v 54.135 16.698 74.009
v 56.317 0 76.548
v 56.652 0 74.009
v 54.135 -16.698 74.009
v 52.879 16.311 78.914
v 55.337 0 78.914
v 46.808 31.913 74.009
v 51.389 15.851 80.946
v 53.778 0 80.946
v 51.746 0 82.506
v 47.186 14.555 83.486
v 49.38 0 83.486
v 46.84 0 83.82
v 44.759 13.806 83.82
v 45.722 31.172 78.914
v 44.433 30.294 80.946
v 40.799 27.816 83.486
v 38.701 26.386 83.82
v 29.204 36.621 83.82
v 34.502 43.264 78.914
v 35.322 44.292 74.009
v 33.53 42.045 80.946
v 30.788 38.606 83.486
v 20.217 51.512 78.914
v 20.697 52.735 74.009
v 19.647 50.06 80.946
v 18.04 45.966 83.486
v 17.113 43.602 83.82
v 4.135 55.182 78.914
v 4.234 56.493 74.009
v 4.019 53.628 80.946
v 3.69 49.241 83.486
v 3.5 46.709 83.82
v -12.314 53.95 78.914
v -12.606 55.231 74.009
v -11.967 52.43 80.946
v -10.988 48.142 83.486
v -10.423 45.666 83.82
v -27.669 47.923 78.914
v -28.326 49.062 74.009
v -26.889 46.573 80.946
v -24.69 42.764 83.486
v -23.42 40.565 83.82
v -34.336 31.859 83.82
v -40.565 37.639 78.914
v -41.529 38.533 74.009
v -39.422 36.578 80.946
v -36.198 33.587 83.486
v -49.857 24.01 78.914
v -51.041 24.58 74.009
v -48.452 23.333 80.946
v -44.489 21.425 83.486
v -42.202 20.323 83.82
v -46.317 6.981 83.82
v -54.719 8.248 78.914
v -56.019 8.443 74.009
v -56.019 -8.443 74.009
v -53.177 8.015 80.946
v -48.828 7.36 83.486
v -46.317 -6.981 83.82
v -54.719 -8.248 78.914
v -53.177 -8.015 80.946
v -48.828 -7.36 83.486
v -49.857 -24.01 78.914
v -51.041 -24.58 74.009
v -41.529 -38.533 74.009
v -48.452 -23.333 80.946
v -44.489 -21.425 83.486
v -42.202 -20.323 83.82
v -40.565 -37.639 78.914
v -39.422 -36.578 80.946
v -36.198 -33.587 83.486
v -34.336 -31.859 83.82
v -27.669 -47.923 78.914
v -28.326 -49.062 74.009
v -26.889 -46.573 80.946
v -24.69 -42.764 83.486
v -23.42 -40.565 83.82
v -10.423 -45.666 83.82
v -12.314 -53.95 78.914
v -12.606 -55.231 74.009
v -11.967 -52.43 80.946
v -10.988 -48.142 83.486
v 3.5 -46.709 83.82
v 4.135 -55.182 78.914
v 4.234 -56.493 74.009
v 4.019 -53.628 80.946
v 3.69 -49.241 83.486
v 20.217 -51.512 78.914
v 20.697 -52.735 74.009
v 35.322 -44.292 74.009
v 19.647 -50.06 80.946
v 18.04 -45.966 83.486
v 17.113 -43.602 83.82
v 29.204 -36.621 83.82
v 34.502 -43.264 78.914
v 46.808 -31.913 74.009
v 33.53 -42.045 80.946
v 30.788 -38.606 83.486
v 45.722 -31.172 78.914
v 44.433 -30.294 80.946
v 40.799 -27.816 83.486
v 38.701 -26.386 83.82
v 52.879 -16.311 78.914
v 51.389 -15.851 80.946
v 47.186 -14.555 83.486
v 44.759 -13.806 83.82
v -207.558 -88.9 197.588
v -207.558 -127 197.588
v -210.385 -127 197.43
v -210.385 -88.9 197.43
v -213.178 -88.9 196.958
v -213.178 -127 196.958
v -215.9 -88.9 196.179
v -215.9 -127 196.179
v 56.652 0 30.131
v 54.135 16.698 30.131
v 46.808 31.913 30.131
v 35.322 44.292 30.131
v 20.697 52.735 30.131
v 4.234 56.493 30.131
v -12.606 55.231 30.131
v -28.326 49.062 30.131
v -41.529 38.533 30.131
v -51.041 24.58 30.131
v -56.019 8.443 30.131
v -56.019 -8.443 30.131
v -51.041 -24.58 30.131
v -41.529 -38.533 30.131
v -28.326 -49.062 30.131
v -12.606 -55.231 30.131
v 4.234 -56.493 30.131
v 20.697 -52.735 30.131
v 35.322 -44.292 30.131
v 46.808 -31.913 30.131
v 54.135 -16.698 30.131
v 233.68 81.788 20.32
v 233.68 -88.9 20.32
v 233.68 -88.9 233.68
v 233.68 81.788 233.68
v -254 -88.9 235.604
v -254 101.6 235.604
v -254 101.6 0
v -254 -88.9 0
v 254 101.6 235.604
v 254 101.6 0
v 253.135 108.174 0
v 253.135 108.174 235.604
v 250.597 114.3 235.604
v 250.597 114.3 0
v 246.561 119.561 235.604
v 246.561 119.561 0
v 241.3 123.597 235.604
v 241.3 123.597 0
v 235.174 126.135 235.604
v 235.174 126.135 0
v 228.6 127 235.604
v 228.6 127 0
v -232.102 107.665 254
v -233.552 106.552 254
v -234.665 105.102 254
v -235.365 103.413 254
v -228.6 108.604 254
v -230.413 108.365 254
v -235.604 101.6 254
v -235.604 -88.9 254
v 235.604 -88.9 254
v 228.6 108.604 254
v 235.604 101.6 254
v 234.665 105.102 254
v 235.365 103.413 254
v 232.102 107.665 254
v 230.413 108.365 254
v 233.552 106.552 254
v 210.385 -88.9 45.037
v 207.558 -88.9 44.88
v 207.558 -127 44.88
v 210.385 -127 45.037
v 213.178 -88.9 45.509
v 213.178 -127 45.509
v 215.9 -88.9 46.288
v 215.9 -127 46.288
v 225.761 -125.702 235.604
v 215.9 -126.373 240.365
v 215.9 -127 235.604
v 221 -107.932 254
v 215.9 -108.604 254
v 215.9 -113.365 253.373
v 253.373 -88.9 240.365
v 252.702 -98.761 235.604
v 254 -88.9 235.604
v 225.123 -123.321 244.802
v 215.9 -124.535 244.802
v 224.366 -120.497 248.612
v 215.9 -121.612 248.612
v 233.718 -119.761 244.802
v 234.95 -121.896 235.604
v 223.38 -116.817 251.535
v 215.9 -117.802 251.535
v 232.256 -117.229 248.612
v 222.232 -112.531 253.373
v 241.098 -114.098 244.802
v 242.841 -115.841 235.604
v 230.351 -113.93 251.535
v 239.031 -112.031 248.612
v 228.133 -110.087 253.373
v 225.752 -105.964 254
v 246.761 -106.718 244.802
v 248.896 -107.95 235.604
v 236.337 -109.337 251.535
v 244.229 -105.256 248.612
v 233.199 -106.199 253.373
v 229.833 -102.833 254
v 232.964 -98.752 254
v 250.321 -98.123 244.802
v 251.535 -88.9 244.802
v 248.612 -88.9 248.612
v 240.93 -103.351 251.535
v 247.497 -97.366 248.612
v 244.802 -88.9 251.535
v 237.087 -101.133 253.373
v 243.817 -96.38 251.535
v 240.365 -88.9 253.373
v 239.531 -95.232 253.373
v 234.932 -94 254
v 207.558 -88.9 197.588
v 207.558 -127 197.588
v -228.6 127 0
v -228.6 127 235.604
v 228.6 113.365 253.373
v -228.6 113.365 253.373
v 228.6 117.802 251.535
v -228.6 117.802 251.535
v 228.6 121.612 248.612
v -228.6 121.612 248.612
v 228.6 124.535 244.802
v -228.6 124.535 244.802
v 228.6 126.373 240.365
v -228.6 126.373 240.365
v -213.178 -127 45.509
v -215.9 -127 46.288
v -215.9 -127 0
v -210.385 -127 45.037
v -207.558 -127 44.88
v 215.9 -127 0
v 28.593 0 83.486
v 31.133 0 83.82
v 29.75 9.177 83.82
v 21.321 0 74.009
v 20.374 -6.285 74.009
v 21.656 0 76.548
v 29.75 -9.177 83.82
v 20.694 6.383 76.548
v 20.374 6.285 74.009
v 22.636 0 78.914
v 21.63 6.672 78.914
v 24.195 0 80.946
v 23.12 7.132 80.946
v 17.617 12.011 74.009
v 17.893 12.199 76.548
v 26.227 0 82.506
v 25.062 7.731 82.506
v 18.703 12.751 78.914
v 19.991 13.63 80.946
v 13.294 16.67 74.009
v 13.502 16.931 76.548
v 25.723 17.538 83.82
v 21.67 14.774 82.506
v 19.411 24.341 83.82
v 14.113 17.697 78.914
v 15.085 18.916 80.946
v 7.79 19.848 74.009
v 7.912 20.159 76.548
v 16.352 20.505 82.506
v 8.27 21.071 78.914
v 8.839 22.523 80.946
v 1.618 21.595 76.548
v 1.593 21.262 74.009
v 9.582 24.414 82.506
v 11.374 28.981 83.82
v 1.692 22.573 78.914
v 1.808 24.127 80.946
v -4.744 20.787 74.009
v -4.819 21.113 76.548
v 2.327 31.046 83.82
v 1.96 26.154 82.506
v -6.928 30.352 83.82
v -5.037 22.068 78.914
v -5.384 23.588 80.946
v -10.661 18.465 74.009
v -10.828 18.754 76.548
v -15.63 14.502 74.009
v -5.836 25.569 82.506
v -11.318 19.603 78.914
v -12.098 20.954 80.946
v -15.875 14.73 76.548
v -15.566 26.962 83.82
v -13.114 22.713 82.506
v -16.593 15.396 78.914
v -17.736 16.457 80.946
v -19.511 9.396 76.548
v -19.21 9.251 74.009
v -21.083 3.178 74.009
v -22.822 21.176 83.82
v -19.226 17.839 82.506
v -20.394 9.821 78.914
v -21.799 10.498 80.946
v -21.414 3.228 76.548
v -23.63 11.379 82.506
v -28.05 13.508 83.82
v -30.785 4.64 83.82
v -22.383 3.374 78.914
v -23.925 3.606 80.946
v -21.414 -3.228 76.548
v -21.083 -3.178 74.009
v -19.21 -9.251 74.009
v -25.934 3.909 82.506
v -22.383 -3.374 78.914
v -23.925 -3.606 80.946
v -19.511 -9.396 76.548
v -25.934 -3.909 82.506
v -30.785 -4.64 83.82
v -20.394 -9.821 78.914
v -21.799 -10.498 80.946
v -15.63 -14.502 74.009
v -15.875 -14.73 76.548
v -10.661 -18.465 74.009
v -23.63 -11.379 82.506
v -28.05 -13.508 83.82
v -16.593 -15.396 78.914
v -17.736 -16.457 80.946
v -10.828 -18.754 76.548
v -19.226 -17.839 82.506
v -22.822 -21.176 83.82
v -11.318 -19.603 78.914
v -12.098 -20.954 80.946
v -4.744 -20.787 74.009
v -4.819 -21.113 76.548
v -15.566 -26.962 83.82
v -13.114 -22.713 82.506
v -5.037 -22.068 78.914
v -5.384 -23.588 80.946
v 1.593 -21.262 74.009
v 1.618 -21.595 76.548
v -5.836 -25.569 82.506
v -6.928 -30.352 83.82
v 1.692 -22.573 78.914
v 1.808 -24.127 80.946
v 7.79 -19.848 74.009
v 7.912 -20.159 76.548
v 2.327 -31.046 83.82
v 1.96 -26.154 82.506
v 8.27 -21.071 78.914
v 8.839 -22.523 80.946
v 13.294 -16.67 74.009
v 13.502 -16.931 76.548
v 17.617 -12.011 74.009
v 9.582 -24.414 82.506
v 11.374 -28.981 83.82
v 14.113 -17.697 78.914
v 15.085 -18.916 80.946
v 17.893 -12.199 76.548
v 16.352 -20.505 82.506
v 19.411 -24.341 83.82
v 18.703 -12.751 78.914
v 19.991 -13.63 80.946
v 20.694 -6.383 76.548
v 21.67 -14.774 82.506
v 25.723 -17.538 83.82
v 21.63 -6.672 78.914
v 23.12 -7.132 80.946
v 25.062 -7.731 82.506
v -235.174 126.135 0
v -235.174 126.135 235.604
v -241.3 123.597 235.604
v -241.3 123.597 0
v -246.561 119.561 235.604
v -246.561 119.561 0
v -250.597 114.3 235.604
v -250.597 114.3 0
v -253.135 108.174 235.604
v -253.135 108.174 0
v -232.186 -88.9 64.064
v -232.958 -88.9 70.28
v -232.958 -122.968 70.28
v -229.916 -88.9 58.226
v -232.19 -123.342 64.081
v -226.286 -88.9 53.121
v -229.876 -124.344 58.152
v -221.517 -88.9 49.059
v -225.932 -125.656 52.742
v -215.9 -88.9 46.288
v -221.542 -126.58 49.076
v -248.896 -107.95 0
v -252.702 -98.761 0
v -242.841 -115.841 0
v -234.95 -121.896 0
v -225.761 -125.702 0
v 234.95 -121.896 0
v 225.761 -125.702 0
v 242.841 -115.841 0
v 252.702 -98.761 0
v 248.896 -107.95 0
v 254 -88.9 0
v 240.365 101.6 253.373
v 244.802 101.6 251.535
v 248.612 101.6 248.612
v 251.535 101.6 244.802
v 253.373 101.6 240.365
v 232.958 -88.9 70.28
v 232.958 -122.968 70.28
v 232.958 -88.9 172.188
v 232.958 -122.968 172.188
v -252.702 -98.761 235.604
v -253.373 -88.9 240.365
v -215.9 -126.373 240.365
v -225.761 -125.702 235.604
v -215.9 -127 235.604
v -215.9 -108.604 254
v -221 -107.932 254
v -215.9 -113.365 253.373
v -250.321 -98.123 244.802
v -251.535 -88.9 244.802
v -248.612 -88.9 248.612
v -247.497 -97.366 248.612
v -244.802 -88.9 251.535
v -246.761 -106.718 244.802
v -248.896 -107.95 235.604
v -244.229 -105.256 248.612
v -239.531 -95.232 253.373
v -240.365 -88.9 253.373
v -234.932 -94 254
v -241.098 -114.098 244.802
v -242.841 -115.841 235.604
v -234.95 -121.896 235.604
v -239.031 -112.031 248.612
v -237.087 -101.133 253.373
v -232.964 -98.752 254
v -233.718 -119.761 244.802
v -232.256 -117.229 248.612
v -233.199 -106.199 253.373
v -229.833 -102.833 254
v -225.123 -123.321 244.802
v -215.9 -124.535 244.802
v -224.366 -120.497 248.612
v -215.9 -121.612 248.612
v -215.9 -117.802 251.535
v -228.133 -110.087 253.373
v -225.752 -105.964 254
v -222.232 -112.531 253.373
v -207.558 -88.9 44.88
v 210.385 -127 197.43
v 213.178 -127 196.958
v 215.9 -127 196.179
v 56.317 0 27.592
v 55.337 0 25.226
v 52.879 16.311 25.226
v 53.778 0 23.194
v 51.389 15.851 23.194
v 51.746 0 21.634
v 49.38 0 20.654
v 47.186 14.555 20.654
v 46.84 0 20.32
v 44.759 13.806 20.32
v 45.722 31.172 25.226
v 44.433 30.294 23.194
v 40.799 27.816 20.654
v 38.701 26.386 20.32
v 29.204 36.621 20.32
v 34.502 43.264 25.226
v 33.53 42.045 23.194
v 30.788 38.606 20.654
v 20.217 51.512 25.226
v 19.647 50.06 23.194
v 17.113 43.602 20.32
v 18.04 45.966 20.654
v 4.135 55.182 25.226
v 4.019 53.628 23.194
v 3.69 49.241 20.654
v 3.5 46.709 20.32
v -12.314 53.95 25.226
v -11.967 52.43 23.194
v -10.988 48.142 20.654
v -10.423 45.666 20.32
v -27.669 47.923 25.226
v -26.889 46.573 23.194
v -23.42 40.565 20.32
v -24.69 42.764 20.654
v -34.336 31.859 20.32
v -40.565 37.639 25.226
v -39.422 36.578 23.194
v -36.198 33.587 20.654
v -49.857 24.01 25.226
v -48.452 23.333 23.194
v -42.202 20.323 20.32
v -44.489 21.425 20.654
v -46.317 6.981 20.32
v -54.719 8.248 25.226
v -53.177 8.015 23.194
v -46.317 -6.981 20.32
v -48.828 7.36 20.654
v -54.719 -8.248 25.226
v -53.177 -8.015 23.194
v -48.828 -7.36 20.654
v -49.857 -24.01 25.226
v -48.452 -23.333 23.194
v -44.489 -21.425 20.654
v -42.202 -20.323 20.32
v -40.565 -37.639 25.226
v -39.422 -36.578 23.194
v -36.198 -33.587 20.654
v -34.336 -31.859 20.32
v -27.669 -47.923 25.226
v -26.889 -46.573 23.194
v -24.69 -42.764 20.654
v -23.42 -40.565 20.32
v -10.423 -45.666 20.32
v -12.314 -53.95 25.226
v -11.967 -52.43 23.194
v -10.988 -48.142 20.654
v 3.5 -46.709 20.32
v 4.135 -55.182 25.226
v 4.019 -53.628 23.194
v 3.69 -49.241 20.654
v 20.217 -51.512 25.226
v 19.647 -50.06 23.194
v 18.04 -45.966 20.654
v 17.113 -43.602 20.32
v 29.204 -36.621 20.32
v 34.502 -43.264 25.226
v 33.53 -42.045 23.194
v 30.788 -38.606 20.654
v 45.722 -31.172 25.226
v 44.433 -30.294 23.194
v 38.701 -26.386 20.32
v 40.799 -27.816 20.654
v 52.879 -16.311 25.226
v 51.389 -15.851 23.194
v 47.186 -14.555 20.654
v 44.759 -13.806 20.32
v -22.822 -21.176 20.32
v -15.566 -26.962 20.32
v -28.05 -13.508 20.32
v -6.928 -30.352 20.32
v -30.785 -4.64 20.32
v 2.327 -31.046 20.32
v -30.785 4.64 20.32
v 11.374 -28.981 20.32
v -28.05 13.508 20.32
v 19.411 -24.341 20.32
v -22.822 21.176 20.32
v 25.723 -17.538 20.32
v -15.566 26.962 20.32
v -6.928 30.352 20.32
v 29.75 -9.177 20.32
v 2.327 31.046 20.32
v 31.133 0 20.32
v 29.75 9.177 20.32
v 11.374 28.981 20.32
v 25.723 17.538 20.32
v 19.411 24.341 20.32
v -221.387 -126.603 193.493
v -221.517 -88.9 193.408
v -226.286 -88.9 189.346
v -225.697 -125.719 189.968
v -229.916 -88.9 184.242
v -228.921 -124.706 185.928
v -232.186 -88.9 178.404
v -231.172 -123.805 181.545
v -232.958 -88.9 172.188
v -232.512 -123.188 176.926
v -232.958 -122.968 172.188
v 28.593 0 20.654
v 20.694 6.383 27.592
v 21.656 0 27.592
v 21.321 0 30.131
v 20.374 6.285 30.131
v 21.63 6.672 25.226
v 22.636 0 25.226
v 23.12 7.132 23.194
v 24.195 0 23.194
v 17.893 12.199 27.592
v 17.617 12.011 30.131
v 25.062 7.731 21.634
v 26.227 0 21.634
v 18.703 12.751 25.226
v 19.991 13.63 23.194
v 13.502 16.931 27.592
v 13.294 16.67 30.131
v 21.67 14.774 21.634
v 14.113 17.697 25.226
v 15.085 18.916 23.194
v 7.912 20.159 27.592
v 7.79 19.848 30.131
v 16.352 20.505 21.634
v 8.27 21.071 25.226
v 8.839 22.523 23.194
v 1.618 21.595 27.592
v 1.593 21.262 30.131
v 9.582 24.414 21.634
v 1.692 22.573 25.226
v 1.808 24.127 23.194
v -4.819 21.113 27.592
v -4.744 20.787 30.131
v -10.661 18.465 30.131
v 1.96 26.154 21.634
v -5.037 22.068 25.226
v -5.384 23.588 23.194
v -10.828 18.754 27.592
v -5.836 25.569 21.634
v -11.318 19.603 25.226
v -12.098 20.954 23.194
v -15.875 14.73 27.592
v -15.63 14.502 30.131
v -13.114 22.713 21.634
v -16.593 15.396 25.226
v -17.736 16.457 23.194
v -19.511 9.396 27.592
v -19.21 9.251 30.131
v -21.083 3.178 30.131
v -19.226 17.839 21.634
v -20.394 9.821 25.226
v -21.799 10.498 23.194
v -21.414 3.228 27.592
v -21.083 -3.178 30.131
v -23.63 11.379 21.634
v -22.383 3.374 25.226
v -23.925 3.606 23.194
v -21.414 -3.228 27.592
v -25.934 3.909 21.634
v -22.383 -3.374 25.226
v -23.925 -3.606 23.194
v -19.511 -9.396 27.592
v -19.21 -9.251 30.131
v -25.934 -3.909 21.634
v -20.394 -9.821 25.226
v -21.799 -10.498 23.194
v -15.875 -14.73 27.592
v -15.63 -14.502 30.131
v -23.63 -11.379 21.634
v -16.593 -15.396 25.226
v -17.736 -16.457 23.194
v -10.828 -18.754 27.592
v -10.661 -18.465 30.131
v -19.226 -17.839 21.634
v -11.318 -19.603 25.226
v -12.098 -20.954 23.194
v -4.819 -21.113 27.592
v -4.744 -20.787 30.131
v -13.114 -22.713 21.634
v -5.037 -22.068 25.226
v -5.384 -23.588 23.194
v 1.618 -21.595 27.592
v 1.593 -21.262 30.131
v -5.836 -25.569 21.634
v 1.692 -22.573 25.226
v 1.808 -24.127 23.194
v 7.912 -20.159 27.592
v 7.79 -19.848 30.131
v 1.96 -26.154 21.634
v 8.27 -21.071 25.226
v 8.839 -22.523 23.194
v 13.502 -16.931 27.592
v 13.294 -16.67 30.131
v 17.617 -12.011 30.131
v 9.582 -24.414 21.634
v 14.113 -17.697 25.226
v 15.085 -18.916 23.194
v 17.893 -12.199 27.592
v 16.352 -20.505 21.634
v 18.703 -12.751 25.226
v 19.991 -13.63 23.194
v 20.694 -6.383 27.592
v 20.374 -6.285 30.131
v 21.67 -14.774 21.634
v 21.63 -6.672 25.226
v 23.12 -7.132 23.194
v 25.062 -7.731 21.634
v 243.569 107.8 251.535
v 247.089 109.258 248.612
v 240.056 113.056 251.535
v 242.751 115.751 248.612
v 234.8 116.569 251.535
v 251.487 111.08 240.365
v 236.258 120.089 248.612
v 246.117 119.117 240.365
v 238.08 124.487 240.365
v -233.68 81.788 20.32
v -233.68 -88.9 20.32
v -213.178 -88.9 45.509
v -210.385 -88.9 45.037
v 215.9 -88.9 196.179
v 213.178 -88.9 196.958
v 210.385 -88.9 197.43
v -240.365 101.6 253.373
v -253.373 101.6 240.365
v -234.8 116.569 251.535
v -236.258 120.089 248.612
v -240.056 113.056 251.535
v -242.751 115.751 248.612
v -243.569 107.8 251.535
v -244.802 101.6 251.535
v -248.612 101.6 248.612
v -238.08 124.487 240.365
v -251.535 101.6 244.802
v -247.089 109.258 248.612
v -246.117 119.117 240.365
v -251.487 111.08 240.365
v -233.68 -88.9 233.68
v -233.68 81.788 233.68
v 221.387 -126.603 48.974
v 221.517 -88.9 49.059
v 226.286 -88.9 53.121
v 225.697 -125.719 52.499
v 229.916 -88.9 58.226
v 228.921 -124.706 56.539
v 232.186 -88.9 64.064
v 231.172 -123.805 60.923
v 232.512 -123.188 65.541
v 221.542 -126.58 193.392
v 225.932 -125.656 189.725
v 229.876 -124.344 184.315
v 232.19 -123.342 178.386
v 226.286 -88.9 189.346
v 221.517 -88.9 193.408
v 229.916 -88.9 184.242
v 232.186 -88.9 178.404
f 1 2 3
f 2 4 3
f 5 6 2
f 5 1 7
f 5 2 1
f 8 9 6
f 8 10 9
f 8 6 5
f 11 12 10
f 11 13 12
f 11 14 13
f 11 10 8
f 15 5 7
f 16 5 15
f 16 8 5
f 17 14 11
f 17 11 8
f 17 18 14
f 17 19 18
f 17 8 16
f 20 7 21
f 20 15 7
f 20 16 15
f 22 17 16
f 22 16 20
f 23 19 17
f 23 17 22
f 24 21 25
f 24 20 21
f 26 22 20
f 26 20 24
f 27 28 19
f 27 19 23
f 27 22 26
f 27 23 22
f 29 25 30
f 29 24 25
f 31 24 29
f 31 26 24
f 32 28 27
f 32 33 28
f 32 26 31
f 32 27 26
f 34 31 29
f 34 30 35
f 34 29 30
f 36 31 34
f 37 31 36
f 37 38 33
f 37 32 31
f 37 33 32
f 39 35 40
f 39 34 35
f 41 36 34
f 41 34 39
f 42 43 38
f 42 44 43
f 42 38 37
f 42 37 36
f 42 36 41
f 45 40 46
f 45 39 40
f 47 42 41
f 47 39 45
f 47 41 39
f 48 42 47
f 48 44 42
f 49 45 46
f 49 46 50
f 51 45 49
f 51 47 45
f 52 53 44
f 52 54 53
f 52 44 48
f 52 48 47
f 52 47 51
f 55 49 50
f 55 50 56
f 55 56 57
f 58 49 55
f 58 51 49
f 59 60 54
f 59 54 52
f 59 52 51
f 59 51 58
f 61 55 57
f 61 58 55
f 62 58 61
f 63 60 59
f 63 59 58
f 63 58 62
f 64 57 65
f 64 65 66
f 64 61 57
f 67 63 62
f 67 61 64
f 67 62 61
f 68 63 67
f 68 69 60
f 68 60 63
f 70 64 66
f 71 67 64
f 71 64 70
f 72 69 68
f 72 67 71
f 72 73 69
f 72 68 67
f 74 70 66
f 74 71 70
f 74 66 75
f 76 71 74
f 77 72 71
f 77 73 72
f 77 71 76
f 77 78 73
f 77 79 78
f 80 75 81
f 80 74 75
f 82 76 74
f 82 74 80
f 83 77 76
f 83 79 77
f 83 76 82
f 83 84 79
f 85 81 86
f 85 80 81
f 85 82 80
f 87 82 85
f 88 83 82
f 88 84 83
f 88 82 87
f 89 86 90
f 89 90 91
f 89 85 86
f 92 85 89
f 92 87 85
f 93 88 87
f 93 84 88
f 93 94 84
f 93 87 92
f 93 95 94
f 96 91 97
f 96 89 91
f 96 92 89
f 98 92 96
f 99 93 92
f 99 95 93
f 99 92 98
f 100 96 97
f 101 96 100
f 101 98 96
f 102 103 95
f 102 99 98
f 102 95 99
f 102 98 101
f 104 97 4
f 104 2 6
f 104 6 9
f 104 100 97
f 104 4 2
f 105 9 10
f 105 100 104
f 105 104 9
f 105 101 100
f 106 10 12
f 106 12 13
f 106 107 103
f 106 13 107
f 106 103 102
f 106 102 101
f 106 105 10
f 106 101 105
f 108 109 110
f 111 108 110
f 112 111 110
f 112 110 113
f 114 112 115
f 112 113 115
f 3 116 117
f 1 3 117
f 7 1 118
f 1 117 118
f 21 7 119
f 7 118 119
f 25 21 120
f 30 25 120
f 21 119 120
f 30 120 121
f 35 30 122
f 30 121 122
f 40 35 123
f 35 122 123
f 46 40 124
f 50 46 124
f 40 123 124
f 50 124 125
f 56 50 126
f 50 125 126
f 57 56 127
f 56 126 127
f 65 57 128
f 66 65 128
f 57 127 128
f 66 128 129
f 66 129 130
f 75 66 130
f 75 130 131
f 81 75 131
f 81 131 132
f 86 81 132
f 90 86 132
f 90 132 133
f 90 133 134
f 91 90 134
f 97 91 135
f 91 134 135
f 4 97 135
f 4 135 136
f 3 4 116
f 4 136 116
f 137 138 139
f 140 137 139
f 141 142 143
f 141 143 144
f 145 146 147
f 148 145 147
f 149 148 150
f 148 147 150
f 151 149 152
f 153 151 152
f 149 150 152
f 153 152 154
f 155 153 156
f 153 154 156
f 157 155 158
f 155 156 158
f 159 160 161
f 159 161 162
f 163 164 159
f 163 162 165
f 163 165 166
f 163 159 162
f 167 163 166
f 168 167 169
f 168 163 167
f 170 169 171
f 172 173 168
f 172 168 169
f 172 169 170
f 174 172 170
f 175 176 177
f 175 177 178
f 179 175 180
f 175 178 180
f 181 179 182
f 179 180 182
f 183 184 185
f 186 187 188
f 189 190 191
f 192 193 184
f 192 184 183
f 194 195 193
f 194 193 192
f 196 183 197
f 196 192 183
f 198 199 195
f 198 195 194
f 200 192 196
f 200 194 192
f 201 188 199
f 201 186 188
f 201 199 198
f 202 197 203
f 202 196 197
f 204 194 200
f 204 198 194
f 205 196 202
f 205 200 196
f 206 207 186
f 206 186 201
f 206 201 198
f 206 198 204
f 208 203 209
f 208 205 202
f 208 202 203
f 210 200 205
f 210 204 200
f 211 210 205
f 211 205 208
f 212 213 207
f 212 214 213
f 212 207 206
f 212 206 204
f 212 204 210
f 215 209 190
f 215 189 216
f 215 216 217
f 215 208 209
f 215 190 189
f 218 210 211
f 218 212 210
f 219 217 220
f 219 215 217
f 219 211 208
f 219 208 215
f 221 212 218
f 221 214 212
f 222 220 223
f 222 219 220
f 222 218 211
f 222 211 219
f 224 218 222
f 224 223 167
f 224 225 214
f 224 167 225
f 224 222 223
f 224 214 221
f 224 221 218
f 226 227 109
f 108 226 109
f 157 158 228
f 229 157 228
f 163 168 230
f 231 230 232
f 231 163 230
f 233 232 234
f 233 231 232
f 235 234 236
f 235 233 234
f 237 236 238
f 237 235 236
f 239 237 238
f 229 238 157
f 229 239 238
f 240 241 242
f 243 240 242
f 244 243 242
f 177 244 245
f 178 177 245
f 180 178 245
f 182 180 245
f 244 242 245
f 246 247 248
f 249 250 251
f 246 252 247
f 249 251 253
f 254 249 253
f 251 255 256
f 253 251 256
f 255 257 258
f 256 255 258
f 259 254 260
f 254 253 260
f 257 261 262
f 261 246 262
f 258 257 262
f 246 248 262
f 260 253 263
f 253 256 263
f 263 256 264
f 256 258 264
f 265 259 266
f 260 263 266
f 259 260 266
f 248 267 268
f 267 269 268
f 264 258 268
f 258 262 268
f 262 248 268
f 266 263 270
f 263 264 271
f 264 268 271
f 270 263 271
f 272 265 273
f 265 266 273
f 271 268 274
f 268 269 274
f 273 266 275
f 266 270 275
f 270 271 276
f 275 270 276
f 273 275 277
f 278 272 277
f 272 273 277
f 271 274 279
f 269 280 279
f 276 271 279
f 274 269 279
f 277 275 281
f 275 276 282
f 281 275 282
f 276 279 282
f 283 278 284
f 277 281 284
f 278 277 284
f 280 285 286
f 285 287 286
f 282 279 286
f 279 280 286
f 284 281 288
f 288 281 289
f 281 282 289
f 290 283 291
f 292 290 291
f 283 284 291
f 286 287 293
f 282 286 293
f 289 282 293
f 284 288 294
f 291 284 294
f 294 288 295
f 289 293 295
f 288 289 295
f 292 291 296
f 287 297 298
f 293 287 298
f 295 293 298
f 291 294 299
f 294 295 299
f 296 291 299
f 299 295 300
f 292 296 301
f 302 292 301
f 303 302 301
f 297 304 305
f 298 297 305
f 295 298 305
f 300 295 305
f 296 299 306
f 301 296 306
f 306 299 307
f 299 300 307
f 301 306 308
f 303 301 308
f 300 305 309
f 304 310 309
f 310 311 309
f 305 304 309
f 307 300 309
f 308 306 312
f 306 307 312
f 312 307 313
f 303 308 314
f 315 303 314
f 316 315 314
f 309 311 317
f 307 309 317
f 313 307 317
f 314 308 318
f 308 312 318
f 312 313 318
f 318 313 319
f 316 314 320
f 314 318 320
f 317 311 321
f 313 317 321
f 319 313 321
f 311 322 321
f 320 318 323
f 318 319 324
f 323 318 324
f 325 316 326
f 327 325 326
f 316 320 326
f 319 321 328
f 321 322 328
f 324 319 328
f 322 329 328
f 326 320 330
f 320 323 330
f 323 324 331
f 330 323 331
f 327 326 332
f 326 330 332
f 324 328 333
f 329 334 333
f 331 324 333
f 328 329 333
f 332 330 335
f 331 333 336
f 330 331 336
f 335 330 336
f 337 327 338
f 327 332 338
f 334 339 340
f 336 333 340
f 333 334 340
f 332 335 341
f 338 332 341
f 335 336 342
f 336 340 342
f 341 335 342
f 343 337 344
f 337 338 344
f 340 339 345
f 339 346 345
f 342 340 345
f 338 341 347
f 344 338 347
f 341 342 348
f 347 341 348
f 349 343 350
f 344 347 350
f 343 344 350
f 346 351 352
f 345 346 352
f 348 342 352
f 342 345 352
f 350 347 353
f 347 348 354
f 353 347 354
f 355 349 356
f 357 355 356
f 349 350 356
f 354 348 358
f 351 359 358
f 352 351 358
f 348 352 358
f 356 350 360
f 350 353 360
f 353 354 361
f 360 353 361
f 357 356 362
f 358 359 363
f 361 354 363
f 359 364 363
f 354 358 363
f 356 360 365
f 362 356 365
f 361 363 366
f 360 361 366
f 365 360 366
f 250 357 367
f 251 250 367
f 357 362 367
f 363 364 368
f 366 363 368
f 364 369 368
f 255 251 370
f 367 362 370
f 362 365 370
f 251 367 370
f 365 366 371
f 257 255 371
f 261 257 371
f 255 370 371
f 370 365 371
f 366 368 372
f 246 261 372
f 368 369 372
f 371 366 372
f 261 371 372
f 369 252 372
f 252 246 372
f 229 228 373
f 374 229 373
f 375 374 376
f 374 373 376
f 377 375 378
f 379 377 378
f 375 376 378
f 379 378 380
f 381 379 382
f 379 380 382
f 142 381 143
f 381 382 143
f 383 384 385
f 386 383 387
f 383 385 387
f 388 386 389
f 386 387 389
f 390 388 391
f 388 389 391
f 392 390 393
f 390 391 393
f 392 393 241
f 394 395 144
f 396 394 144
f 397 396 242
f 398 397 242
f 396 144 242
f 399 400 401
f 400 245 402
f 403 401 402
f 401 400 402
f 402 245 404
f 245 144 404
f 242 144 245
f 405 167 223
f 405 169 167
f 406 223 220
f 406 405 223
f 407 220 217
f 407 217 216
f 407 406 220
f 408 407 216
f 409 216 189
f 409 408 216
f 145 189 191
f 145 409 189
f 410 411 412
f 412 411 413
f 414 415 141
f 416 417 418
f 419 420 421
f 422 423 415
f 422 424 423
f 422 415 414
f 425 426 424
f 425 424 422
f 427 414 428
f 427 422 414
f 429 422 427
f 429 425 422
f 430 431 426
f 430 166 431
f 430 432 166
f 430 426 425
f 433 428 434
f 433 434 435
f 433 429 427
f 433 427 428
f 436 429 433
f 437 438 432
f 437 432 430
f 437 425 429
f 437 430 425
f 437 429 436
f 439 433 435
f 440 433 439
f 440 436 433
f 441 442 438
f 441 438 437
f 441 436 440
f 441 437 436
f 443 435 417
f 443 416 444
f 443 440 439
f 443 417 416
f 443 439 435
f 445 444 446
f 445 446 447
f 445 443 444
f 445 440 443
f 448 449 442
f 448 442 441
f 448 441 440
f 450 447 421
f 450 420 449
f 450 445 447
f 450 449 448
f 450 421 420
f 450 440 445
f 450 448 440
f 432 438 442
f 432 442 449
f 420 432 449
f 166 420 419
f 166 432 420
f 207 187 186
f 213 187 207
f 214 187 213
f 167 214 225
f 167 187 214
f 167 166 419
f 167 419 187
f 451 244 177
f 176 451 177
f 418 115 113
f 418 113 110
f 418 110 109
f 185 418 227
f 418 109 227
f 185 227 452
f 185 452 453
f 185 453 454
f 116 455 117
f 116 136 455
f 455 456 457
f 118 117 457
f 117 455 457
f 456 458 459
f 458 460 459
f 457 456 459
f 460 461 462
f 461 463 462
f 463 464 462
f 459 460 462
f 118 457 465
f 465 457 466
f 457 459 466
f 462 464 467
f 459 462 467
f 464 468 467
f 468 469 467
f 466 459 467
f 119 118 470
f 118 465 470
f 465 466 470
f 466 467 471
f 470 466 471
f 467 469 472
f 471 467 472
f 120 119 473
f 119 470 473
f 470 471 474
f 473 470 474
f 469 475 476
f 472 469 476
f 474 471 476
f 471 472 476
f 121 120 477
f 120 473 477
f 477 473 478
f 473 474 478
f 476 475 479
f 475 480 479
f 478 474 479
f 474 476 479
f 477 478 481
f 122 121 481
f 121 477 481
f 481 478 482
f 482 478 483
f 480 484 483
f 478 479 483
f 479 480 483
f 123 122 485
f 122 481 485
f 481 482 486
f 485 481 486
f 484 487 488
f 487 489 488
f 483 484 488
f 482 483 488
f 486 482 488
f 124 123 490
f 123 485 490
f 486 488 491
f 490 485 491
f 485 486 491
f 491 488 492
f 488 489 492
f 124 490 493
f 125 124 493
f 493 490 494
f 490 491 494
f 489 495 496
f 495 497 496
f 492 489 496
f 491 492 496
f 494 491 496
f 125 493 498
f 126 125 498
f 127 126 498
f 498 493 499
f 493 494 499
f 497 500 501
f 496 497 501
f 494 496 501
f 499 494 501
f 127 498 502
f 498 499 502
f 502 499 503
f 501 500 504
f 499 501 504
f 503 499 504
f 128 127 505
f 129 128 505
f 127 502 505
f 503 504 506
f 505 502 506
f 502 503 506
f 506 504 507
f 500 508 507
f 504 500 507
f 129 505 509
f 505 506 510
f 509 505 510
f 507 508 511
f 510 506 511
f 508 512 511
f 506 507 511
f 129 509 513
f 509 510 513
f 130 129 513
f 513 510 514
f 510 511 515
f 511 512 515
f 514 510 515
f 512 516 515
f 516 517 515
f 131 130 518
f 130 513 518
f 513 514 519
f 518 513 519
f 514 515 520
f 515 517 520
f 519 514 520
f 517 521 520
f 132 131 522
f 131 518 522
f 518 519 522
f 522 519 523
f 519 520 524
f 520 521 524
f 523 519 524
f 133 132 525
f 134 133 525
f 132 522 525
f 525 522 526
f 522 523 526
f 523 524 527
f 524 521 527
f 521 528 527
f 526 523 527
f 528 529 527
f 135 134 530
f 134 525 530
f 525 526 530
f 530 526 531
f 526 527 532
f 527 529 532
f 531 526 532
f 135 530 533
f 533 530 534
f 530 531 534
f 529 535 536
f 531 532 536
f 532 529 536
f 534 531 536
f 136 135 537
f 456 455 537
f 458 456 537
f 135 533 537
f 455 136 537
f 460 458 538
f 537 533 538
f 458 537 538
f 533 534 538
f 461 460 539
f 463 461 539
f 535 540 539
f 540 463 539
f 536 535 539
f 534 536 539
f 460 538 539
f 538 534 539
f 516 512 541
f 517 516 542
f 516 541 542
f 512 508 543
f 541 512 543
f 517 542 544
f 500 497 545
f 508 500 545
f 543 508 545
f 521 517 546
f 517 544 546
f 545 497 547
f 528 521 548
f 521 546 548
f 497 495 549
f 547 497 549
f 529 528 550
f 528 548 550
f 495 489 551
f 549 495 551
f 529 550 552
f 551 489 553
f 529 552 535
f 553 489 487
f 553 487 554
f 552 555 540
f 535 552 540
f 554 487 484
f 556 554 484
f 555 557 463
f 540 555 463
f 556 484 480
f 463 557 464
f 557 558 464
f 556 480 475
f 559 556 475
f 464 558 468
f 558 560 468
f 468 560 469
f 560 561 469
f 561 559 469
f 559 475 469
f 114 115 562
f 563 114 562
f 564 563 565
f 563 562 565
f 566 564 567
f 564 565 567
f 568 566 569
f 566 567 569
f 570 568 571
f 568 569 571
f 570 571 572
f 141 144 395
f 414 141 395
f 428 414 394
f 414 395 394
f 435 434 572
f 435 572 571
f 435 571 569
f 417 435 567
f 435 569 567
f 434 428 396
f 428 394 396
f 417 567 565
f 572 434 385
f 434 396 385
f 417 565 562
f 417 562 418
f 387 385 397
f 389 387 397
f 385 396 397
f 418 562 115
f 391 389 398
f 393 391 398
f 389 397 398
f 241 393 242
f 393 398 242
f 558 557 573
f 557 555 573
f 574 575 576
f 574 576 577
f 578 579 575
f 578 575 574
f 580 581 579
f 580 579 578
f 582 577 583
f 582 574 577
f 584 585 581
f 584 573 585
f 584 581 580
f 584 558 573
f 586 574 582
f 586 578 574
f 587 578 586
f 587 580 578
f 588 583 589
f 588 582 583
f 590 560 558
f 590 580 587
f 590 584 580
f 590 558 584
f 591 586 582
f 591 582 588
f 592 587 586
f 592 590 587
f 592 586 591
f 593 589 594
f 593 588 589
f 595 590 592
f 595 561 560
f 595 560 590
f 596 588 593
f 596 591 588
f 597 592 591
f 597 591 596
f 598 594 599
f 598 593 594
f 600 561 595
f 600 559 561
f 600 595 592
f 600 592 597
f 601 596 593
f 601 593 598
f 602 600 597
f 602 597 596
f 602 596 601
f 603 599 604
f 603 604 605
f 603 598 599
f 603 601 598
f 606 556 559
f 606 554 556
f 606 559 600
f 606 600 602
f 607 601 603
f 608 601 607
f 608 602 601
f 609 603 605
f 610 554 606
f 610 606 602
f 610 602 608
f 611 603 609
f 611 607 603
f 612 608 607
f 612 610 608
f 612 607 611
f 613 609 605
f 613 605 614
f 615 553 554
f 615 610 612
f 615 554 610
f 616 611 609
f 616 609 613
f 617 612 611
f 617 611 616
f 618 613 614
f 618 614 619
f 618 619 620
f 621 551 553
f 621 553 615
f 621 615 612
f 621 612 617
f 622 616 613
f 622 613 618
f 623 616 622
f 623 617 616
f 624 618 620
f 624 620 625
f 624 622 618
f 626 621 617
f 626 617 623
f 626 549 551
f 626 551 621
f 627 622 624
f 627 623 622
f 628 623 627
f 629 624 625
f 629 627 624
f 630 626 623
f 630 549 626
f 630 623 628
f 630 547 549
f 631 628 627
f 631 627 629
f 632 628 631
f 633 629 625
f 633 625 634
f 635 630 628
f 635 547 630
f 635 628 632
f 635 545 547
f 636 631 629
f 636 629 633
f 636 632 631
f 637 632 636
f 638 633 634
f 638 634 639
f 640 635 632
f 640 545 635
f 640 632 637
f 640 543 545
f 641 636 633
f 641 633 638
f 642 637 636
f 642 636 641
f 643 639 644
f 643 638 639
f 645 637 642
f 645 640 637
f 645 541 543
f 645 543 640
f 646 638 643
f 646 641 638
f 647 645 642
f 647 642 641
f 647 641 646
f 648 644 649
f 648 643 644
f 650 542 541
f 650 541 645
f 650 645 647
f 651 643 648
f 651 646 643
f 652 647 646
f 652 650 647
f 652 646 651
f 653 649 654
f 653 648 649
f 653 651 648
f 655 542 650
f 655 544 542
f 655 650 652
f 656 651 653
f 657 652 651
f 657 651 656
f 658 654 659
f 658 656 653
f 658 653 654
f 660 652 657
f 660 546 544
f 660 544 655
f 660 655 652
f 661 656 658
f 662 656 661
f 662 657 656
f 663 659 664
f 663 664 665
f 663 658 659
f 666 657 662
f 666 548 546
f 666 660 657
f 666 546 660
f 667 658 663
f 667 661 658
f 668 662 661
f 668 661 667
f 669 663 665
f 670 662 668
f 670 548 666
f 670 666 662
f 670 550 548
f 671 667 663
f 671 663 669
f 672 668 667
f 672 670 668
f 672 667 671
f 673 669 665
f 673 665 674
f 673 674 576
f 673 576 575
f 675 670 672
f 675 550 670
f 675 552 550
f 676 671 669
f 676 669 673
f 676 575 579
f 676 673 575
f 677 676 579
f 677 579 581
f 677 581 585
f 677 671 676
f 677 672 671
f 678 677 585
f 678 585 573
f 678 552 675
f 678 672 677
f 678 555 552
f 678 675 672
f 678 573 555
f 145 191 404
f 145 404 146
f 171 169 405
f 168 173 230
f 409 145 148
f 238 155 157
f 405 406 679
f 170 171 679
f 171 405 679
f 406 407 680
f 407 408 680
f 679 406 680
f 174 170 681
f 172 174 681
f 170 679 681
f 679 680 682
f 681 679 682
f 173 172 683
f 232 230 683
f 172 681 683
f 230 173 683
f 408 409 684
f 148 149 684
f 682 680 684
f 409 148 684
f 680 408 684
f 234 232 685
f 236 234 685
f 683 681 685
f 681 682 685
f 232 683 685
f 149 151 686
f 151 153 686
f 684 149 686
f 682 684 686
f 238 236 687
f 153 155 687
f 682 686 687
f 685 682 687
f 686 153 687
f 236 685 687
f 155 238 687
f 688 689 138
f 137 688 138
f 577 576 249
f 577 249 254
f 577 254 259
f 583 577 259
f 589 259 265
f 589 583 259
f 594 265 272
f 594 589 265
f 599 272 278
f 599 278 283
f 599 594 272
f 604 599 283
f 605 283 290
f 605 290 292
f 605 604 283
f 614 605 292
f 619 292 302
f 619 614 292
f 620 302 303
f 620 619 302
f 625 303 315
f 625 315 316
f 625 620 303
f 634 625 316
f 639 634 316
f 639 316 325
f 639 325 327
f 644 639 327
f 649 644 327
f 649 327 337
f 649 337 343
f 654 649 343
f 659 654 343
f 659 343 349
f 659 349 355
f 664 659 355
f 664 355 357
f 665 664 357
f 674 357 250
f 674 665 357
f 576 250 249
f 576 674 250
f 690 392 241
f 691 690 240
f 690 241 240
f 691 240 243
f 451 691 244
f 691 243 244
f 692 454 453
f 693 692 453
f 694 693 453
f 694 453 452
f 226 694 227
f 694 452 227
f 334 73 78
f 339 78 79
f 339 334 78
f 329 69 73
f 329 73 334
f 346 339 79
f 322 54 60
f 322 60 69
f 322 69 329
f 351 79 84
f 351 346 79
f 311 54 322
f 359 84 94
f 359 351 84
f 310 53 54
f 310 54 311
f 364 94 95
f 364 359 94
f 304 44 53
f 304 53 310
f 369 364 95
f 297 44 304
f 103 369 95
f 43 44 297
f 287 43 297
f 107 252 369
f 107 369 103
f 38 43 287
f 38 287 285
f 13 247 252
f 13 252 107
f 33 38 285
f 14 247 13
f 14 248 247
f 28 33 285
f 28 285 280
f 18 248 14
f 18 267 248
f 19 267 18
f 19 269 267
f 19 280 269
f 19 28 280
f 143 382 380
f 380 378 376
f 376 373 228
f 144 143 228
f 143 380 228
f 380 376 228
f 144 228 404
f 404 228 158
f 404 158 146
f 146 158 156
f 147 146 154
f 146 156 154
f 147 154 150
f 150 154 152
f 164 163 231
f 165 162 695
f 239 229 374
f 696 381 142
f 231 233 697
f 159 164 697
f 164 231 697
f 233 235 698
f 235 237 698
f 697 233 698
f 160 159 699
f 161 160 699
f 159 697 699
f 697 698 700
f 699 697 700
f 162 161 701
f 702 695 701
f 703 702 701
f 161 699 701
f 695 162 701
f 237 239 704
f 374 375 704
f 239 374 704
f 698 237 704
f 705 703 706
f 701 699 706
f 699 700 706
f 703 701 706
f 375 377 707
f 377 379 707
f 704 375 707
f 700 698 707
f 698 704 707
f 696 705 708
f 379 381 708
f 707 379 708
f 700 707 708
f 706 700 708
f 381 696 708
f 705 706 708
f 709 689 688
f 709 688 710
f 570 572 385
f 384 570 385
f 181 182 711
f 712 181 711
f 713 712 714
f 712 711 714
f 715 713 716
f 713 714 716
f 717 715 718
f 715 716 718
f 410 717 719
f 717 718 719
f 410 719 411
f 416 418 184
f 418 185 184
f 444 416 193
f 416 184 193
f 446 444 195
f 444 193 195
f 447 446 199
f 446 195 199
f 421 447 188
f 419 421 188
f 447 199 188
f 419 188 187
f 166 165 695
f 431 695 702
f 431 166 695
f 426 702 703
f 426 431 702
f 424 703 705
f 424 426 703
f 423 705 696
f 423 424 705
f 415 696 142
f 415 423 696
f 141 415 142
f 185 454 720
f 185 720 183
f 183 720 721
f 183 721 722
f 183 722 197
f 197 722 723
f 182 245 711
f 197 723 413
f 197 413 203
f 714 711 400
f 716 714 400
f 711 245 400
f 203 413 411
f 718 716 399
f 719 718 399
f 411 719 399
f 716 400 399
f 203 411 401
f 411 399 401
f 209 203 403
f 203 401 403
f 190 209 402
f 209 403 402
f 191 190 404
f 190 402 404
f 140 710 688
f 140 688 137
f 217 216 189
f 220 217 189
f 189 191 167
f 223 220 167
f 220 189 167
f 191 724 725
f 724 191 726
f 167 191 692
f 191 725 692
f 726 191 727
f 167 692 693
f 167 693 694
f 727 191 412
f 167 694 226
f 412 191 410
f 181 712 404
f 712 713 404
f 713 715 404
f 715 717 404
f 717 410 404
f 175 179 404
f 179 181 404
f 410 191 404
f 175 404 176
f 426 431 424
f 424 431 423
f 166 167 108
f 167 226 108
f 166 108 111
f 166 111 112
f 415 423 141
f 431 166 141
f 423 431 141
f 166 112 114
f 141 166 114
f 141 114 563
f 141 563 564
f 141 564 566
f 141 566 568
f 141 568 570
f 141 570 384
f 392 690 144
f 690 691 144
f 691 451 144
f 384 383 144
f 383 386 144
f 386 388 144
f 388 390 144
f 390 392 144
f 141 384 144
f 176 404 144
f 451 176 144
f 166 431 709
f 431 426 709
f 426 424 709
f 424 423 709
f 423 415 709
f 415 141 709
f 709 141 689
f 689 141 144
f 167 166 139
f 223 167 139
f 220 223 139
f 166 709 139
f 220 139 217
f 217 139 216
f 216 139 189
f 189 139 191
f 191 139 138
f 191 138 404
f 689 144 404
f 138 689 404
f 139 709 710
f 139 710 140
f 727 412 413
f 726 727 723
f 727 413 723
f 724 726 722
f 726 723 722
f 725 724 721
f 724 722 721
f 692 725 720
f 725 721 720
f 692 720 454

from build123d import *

# Parameters (mm, degrees)
F1_DEPTH  = 254
F2_DEPTH  = 254
F3_W      = 467.3599997461
F3_H      = 213.3599997461
F4_DEPTH  = 170.18
F5_DEPTH  = 170.688
F6_R      = 56.6515592814
F6_R_2    = 21.3213706436
F7_DEPTH  = 63.5
F8_R      = 9.8113639175
F10_DEPTH = 50.8
F11_R     = 18.3963073453
F11_2_R   = 18.3963073453


with BuildPart() as f1:
    # F0 (on Top) → F1 (new body)
    with BuildSketch(Plane.XY):
        with BuildLine():
            Line((-215.9, -127), (215.9, -127))
            ThreePointArc((215.9, -127), (242.8407683632, -115.8407683632), (254, -88.9))
            Line((254, -88.9), (-254, -88.9))
            ThreePointArc((-254, -88.9), (-242.8407683632, -115.8407683632), (-215.9, -127))
        make_face()
    extrude(amount=F1_DEPTH)

    # F9 (on face) → F10 (cut)
    with BuildSketch(Plane.XZ.offset(127)):
        with BuildLine():
            Line((-207.5579591751, 44.8795184493), (207.5579591751, 44.8795184493))
            ThreePointArc((207.5579591751, 44.8795184493), (211.7880535175, 45.2342334269), (215.9, 46.2884710592))
            Line((215.9, 46.2884710592), (215.9, 196.1787982422))
            ThreePointArc((215.9, 196.1787982422), (211.7880535175, 197.2330358745), (207.5579591751, 197.5877508521))
            Line((207.5579591751, 197.5877508521), (-207.5579591751, 197.5877508521))
            ThreePointArc((-207.5579591751, 197.5877508521), (-211.7880535175, 197.2330358745), (-215.9, 196.1787982422))
            Line((-215.9, 196.1787982422), (-215.9, 46.2884710592))
            ThreePointArc((-215.9, 46.2884710592), (-211.7880535175, 45.2342334269), (-207.5579591751, 44.8795184493))
        make_face()
        with BuildLine():
            Line((215.9, 196.1787982422), (215.9, 46.2884710592))
            ThreePointArc((215.9, 46.2884710592), (228.2587784458, 55.5609559677), (232.9579591751, 70.2795184493))
            Line((232.9579591751, 70.2795184493), (232.9579591751, 172.1877508521))
            ThreePointArc((232.9579591751, 172.1877508521), (228.2587784458, 186.9063133337), (215.9, 196.1787982422))
        make_face()
        with BuildLine():
            ThreePointArc((-232.9579591751, 70.2795184493), (-228.2587784458, 55.5609559677), (-215.9, 46.2884710592))
            Line((-215.9, 46.2884710592), (-215.9, 196.1787982422))
            ThreePointArc((-215.9, 196.1787982422), (-228.2587784458, 186.9063133337), (-232.9579591751, 172.1877508521))
            Line((-232.9579591751, 172.1877508521), (-232.9579591751, 70.2795184493))
        make_face()
    extrude(amount=-F10_DEPTH, mode=Mode.SUBTRACT)

    # F11
    f11_edges = [f1.edges().sort_by_distance(p)[0] for p in [
        (242.840768, -115.840768, 254),
        (-242.840768, -115.840768, 254),
        (0, -127, 254),
    ]]
    fillet(f11_edges, radius=F11_R)


with BuildPart() as f2:
    # F0 (on Top) → F2 (new body)
    with BuildSketch(Plane.XY):
        with BuildLine():
            Line((-254, -88.9), (254, -88.9))
            Line((254, -88.9), (254, 101.6))
            ThreePointArc((254, 101.6), (246.5605122421, 119.5605122421), (228.6, 127))
            Line((228.6, 127), (-228.6, 127))
            ThreePointArc((-228.6, 127), (-246.5605122421, 119.5605122421), (-254, 101.6))
            Line((-254, 101.6), (-254, -88.9))
        make_face()
    extrude(amount=F2_DEPTH)


with BuildPart() as f4:
    # F3 (on face) → F4 (new body)
    with BuildSketch(Plane.XZ.offset(88.9)):
        with Locations((0, 127)):
            Rectangle(F3_W, F3_H)
    extrude(amount=-F4_DEPTH)


with BuildPart() as f5_tool:
    # F3 (on face) → F5 (new body)
    with BuildSketch(Plane.XZ.offset(88.9)):
        with Locations((0, 127)):
            Rectangle(F3_W, F3_H)
    extrude(amount=-F5_DEPTH)


with BuildPart() as f2_1:
    add(f2.part)

    # F5: cut by f5_tool
    add(f5_tool.part, mode=Mode.SUBTRACT)

    # F11#2
    f11_2_edges = [f2_1.edges().sort_by_distance(p)[0] for p in [
        (254, 6.35, 254),
        (246.560512, 119.560512, 254),
        (0, 127, 254),
        (-246.560512, 119.560512, 254),
        (-254, 6.35, 254),
    ]]
    fillet(f11_2_edges, radius=F11_2_R)


with BuildPart() as f4_1:
    add(f4.part)

    # F5: cut by f5_tool
    add(f5_tool.part, mode=Mode.SUBTRACT)


with BuildPart() as f7:
    # F6 (on face) → F7 (new body)
    with BuildSketch(Plane.XY.offset(20.320000127)):
        Circle(F6_R)
        Circle(F6_R_2, mode=Mode.SUBTRACT)
    extrude(amount=F7_DEPTH)

    # F8
    f8_edges = [f7.edges().sort_by_distance(p)[0] for p in [
        (-56.651559, 0, 83.82),
        (-21.321371, 0, 83.82),
        (21.321371, 0, 52.07),
        (-21.321371, 0, 20.32),
        (-56.651559, 0, 20.32),
    ]]
    fillet(f8_edges, radius=F8_R)


solid = Compound([f1.part, f2_1.part, f7.part])
